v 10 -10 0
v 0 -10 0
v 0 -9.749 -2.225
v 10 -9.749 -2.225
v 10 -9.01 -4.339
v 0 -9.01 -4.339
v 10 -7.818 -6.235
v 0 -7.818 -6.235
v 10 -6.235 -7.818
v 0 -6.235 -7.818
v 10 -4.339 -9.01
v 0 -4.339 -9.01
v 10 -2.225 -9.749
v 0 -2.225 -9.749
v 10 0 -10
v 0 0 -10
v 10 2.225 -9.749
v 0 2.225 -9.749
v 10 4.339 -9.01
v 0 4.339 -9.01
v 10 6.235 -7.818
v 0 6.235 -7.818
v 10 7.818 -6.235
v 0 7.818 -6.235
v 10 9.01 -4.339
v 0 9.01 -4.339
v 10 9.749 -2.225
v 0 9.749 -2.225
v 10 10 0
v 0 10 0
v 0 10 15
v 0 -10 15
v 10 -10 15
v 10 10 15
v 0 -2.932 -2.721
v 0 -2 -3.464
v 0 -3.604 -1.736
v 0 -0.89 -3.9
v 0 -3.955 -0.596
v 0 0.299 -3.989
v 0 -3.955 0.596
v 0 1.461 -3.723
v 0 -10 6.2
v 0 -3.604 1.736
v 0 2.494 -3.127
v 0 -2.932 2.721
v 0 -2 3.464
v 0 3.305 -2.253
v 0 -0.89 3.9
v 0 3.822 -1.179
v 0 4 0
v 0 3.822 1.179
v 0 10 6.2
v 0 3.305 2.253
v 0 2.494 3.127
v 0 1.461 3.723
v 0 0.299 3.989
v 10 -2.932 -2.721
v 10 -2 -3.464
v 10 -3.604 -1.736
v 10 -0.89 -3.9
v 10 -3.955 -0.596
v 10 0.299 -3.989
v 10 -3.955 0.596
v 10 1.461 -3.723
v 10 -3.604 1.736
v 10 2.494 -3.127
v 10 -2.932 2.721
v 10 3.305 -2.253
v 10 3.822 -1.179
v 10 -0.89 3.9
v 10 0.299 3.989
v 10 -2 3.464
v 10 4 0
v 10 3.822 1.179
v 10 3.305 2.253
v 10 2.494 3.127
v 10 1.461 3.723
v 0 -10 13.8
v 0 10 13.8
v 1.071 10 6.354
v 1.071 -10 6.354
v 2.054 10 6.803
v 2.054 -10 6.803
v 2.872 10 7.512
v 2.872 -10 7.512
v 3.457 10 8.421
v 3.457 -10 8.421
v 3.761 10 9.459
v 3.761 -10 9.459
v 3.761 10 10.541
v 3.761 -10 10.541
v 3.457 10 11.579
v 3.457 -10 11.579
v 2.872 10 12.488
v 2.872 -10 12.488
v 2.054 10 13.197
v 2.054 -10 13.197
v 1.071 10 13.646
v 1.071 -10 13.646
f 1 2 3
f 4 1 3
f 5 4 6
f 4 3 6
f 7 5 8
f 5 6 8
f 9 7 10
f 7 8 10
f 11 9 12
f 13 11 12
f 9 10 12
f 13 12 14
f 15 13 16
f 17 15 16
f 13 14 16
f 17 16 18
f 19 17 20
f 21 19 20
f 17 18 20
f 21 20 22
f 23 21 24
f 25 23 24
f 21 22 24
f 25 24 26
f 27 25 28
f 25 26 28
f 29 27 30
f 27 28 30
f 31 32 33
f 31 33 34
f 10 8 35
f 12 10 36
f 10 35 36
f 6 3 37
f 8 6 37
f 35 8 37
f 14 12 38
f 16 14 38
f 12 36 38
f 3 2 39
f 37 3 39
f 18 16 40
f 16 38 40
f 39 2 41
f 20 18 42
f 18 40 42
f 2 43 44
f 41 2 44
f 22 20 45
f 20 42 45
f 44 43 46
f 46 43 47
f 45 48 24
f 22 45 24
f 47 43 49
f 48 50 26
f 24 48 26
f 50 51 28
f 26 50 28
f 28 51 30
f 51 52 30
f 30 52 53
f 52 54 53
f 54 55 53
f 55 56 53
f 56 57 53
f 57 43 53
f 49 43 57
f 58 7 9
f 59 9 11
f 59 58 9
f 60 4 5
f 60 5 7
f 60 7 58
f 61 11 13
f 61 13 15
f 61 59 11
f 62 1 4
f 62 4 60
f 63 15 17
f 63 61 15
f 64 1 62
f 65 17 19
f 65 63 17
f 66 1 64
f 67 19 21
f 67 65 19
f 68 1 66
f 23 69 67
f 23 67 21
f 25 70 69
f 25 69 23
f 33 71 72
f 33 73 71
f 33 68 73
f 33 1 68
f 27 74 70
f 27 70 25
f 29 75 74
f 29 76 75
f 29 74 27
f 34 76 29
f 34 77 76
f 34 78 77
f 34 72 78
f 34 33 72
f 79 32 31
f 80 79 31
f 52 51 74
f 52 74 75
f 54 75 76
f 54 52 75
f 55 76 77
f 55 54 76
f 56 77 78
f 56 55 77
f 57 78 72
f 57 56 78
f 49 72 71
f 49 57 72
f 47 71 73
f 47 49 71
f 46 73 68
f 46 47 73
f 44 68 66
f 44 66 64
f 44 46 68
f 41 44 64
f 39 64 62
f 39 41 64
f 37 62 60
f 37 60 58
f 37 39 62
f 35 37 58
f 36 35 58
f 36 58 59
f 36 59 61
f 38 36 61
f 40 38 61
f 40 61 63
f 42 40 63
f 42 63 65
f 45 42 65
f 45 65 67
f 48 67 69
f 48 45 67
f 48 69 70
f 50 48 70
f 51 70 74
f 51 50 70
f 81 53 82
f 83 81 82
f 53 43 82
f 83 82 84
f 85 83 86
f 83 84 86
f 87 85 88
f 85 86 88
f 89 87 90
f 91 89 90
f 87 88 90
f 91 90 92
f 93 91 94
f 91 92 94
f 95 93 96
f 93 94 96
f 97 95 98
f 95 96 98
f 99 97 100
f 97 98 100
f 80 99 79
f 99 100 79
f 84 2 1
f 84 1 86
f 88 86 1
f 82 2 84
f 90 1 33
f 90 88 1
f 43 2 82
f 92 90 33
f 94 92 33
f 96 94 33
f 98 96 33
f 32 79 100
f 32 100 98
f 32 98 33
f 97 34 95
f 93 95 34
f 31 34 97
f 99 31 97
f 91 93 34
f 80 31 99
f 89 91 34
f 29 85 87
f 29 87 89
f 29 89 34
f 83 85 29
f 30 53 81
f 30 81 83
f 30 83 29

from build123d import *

# Parameters (mm, degrees)
SKETCH001_R  = 3.8
PAD001_DEPTH = 20
SKETCH_R     = 4
PAD_DEPTH    = 10


with BuildPart() as rodmount:
    # Sketch001 → Pad001 (new body)
    with BuildSketch(Plane.XZ.offset(10)):
        with Locations((0, 10)):
            Circle(SKETCH001_R)
    extrude(amount=-PAD001_DEPTH)


with BuildPart() as rodmount001:
    # Sketch → Pad (new body)
    with BuildSketch(Plane.YZ):
        with BuildLine():
            ThreePointArc((-10, 4.2e-05), (-2.1e-05, -10), (10, 0))
            Line((10, 15.000042), (10, 0))
            Line((-10, 15.000042), (10, 15.000042))
            Line((-10, 4.2e-05), (-10, 15.000042))
        make_face()
        Circle(SKETCH_R, mode=Mode.SUBTRACT)
    extrude(amount=PAD_DEPTH)

    # Cut: cut RodMount
    add(rodmount.part, mode=Mode.SUBTRACT)


solid = rodmount001.part
